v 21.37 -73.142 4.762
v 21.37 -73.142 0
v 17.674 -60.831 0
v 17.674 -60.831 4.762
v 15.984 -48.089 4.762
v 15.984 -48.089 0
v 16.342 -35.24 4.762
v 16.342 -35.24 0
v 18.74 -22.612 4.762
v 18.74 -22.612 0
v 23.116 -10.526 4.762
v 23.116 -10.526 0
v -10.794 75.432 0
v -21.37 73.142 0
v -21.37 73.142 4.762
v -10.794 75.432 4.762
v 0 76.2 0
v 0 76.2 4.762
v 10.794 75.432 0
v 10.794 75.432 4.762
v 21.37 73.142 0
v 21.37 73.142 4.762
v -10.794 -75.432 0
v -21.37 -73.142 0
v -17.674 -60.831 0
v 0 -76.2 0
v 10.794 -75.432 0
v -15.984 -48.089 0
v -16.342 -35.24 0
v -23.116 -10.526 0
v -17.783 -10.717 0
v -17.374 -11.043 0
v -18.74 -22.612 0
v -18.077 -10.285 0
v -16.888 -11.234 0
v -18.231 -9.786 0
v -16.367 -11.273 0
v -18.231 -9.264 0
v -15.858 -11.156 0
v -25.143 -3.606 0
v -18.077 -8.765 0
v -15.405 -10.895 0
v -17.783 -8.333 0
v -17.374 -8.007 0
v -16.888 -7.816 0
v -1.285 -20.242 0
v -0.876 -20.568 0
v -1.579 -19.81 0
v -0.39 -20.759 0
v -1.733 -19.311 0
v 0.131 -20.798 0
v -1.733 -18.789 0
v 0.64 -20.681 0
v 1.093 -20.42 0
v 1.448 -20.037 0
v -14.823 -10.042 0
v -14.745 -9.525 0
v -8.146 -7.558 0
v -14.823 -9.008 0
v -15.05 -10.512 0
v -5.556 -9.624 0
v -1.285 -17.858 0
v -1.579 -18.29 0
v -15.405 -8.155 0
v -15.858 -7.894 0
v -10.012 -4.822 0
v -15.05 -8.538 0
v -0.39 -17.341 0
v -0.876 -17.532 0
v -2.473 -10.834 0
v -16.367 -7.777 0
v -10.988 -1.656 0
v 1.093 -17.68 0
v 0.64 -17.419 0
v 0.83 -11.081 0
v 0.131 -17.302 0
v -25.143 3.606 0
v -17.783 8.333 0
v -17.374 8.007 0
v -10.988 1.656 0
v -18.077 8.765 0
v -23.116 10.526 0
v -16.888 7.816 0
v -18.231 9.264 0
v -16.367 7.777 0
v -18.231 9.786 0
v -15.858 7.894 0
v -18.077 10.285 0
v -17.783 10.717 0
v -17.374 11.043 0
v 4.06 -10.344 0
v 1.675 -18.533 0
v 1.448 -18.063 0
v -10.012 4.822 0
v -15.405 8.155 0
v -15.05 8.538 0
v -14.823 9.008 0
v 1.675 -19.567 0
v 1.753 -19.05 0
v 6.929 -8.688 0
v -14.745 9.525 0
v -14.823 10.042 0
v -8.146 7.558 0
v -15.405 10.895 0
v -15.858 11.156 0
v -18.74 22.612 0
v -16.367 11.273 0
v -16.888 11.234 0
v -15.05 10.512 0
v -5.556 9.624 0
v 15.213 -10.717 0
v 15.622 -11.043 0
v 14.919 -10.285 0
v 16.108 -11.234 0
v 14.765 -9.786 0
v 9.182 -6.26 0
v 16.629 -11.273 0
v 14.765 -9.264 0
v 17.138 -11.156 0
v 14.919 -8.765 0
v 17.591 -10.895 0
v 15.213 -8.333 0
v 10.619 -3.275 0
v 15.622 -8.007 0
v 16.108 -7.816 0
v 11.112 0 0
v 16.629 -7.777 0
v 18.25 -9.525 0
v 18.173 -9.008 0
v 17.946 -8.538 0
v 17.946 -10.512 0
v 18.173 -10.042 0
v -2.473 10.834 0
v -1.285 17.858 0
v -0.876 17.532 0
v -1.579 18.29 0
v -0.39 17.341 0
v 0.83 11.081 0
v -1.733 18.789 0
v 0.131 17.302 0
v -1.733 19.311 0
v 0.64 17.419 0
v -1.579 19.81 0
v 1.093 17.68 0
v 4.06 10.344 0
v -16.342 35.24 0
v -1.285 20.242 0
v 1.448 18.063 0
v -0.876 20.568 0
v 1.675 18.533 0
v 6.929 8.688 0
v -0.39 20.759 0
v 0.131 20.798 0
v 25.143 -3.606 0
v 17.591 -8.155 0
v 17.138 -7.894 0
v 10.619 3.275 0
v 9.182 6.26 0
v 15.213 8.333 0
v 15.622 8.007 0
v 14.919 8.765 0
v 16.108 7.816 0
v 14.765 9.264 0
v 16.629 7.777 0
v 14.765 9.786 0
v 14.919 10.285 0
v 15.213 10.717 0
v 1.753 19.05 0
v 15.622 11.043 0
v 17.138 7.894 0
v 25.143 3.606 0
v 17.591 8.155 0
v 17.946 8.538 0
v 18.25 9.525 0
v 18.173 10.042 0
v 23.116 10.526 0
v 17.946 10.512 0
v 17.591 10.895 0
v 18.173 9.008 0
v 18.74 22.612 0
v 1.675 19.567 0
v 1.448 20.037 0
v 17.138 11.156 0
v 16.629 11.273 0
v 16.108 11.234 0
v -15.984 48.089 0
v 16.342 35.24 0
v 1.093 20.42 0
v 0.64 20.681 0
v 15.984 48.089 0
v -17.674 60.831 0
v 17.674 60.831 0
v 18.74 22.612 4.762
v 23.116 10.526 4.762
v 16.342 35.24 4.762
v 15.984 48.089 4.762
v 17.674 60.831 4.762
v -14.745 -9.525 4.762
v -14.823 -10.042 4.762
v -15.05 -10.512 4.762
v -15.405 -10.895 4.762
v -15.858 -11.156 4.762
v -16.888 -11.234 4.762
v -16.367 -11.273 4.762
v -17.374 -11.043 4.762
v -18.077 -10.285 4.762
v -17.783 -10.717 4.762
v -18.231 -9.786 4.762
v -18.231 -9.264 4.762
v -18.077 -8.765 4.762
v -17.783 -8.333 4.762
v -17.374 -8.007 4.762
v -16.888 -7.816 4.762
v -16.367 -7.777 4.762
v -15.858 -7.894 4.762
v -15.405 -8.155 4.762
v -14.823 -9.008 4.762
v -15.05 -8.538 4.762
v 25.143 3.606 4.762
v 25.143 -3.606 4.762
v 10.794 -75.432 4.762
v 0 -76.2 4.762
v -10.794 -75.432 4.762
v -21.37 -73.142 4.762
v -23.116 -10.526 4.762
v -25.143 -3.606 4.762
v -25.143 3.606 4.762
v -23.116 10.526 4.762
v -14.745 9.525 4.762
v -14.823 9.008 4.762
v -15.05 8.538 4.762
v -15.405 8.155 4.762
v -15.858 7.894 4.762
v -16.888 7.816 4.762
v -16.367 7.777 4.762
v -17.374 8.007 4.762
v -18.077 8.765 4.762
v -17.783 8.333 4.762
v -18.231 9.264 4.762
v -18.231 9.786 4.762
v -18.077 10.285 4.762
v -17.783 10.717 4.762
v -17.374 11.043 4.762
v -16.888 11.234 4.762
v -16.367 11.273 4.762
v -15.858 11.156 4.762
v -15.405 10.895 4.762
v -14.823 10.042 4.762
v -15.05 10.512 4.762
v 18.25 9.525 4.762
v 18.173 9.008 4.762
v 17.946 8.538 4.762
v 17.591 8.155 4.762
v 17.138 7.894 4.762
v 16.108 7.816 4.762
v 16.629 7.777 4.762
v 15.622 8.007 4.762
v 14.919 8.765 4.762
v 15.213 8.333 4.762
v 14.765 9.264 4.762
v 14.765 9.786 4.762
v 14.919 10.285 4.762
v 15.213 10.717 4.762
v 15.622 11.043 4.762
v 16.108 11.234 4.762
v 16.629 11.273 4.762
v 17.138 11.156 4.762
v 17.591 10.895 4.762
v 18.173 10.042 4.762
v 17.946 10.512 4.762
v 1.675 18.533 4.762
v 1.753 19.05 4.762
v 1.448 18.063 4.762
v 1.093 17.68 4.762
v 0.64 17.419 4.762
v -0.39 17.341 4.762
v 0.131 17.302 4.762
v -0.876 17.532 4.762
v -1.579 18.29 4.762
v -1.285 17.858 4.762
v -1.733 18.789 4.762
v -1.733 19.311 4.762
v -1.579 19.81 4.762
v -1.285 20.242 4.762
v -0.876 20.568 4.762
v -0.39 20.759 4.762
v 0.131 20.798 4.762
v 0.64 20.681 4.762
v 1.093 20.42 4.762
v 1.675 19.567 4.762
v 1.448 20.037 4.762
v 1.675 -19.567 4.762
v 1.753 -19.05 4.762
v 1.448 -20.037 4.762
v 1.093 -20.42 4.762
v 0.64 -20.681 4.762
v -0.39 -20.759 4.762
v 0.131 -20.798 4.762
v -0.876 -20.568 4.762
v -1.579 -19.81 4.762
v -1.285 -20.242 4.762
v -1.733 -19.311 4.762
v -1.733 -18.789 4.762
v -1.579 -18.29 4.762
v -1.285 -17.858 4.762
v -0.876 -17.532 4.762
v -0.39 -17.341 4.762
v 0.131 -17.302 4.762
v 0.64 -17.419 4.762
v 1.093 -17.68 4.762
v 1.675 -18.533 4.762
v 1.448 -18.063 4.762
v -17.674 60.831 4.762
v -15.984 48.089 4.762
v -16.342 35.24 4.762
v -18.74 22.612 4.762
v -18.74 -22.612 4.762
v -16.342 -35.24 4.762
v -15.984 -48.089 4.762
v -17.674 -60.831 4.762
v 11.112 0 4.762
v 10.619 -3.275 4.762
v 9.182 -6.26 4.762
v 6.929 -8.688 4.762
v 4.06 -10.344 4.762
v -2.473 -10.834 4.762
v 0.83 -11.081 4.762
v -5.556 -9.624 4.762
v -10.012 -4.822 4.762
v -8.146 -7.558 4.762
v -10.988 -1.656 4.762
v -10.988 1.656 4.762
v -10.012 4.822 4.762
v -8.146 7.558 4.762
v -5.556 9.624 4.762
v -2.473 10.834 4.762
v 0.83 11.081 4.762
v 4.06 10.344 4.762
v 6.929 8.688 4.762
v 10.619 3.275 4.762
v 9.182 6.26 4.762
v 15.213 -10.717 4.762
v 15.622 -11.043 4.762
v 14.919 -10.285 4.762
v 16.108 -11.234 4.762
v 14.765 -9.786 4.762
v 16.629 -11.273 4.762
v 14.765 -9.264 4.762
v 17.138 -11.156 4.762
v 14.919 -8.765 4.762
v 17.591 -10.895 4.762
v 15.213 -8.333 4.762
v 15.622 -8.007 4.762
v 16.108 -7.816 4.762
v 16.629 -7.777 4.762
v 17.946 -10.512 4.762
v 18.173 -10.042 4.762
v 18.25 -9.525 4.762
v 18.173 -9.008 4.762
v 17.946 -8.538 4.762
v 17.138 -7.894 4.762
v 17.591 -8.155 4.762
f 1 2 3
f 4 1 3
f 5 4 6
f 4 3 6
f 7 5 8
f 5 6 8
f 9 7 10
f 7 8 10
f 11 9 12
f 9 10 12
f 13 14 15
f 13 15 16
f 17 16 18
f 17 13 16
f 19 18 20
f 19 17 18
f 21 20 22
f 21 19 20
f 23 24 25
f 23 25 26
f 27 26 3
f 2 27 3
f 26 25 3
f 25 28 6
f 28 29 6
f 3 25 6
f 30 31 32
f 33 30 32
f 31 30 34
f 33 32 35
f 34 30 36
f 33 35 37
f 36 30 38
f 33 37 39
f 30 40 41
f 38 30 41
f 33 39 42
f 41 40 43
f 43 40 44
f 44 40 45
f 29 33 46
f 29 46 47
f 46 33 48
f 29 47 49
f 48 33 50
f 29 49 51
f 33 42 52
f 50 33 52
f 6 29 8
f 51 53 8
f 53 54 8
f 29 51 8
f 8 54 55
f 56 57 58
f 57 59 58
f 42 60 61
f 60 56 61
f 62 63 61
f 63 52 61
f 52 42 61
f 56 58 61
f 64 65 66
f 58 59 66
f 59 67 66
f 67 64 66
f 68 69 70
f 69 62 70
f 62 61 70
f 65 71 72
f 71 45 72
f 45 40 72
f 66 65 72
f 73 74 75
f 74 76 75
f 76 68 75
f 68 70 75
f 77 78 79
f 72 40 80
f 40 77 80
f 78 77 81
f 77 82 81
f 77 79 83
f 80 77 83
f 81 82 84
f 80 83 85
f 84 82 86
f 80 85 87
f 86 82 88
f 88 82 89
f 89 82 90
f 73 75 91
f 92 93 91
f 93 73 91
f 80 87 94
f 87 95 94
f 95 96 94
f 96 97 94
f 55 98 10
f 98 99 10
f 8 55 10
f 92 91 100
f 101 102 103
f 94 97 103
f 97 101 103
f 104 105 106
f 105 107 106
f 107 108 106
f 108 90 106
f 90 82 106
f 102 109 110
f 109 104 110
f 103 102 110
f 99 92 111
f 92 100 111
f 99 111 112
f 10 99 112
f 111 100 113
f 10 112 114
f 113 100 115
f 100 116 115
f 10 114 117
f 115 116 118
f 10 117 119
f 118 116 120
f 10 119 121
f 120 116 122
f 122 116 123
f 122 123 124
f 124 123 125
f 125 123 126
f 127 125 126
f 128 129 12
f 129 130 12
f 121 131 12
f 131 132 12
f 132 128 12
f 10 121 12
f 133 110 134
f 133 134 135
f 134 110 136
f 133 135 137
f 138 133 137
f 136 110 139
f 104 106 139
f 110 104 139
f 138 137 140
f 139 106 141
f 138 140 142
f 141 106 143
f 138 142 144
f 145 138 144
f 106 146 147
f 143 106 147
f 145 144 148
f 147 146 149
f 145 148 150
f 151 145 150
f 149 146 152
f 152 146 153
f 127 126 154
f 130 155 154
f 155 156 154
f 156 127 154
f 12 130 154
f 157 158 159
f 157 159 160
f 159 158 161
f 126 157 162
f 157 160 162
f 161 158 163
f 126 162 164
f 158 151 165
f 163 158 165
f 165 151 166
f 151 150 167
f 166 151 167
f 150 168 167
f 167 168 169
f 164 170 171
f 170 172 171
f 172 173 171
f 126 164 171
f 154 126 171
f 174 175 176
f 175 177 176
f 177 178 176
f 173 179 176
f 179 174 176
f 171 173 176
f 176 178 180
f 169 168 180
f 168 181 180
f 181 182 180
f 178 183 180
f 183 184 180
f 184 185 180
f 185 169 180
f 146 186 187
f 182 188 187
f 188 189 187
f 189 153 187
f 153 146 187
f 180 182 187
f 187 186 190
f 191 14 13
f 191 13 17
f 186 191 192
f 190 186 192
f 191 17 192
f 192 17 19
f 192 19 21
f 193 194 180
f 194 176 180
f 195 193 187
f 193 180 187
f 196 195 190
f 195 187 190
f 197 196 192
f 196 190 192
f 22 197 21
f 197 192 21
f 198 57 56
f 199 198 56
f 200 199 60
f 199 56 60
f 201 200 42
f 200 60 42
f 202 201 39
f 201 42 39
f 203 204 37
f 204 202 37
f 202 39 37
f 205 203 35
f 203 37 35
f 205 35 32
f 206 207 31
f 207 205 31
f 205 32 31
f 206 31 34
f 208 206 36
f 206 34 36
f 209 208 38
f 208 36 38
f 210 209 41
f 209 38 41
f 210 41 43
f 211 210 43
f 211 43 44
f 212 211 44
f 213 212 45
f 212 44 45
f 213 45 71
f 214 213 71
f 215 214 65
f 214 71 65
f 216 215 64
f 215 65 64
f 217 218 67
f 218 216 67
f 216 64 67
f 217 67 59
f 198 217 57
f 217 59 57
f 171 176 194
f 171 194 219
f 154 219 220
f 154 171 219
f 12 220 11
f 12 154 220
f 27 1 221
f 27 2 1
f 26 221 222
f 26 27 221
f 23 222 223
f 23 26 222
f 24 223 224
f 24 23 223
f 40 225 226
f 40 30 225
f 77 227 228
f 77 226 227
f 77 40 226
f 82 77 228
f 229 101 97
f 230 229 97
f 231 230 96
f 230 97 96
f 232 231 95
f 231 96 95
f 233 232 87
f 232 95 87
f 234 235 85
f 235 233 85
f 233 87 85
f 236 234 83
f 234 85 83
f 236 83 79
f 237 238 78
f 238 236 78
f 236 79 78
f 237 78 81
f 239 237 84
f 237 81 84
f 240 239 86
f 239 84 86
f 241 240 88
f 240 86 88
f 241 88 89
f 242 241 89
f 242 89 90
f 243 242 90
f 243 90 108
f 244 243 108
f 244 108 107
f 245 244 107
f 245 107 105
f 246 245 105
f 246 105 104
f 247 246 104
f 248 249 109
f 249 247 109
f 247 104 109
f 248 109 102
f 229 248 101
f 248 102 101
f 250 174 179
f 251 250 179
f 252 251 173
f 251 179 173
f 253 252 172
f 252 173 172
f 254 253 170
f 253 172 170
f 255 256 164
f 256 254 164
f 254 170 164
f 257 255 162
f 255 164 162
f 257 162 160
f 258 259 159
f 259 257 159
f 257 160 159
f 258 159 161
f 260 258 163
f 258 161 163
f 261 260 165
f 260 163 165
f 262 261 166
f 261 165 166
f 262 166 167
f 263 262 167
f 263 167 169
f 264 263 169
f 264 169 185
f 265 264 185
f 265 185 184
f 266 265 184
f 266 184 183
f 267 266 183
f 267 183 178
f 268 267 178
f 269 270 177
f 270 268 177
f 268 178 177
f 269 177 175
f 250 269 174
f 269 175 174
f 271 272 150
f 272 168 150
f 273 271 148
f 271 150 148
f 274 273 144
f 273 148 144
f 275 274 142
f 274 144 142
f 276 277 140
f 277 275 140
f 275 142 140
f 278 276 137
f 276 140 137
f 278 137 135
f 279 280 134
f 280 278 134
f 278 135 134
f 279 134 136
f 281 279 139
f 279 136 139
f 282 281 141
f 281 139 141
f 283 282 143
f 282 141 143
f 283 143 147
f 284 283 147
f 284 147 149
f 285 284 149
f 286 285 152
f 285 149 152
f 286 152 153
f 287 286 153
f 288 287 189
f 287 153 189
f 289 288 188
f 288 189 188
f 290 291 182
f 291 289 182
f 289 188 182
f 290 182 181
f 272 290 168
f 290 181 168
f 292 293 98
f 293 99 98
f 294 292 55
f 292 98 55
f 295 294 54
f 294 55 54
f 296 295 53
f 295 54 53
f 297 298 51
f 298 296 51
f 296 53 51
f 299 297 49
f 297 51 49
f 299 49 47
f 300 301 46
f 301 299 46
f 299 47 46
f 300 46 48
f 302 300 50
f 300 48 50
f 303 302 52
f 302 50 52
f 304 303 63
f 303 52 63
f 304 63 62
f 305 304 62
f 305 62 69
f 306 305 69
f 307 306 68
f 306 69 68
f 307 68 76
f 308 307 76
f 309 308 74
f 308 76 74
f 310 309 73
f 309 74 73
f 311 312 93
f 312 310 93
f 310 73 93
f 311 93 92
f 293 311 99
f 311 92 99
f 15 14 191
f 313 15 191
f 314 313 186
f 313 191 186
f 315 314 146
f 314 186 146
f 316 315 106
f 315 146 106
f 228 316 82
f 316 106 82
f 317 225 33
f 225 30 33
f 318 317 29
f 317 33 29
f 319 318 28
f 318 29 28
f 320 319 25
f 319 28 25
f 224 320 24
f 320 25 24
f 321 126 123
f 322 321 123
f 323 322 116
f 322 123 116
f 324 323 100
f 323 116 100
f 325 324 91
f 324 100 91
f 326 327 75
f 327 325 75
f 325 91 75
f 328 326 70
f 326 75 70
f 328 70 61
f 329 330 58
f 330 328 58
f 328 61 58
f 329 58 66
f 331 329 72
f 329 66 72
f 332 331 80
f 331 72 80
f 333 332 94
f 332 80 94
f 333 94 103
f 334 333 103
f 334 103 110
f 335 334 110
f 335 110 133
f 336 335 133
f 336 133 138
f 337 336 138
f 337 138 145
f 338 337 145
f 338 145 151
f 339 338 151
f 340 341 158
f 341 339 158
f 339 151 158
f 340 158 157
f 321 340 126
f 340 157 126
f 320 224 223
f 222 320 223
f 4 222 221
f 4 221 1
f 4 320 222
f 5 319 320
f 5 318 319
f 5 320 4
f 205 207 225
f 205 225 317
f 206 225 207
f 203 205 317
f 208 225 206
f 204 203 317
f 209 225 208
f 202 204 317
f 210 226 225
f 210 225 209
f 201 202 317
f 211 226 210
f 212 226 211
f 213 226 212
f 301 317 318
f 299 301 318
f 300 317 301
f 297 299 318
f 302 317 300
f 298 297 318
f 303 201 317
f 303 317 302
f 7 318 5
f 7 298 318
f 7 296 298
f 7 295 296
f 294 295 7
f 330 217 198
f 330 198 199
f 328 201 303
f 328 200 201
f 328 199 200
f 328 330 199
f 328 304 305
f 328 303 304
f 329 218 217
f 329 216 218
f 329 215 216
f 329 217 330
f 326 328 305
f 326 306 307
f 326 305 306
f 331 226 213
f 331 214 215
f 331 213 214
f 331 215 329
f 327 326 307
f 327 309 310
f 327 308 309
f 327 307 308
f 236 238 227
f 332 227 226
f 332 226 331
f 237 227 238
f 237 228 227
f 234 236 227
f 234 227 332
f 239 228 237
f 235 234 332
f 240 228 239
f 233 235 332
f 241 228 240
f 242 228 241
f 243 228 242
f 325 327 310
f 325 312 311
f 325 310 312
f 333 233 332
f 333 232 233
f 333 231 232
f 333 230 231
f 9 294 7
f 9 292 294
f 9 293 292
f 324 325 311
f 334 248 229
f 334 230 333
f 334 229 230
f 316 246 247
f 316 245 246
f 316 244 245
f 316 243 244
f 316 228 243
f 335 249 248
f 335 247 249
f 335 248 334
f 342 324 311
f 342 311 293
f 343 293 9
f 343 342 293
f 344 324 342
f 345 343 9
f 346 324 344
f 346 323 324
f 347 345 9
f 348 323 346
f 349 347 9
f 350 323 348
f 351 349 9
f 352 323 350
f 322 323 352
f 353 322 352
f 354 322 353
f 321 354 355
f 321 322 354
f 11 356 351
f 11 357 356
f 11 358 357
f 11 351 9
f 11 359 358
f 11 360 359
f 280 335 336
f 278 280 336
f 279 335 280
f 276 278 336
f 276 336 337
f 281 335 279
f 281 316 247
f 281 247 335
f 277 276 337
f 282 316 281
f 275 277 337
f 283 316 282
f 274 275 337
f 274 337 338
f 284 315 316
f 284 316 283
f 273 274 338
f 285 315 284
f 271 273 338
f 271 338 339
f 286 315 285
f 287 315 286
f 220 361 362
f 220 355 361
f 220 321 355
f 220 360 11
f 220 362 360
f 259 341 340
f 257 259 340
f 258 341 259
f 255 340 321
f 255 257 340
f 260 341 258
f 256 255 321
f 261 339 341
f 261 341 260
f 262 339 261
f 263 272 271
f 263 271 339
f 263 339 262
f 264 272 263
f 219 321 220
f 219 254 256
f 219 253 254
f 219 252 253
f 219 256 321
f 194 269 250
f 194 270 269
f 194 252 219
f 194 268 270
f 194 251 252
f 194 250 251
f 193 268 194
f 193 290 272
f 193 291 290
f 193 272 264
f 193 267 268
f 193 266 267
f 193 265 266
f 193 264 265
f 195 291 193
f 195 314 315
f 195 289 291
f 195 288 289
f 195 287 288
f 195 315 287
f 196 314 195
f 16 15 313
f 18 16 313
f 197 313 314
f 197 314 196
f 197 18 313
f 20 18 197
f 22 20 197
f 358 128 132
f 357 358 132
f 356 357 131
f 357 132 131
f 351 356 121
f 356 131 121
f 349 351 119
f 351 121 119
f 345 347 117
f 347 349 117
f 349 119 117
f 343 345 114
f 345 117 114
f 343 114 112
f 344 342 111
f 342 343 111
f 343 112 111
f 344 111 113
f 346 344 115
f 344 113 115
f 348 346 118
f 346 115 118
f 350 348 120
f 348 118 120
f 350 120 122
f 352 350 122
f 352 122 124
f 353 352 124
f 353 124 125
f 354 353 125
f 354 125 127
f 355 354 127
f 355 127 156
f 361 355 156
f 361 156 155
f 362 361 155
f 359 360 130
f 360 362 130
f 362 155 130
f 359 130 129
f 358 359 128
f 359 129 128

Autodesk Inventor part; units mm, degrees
ref_plane "YZ Plane" through (0, 0, 0) normal (1, 0, 0) x (0, 1, 0)
ref_plane "XZ Plane" through (0, 0, 0) normal (0, 1, 0) x (-1, 0, 0)
ref_plane "XY Plane" through (0, 0, 0) normal (0, 0, 1) x (1, 0, 0)
sketch "Sketch1" plane through (0, 0, 0) normal (0, 0, 1) x (1, 0, 0)
  circle A0 centre (0, 0) radius 11.1125
  line L0 (0, 0) -> (0, 19.05) construction
  circle A1 centre (0, 19.05) radius 1.7526
  circle A2 centre (-16.4978, 9.525) radius 1.7526
  circle A3 centre (-16.4978, -9.525) radius 1.7526
  circle A4 centre (0, -19.05) radius 1.7526
  circle A5 centre (16.4978, -9.525) radius 1.7526
  circle A6 centre (16.4978, 9.525) radius 1.7526
  circle A7 centre (0, 0) radius 76.2 construction
  line L1 (-15.875, -74.528) -> (15.875, -74.528) construction
  line L2 (15.875, -74.528) -> (15.875, 74.528) construction
  line L3 (15.875, 74.528) -> (-15.875, 74.528) construction
  line L4 (-15.875, 74.528) -> (-15.875, -74.528) construction
  line L5 (-15.875, -74.528) -> (15.875, 74.528) construction
  line L6 (15.875, -74.528) -> (-15.875, 74.528) construction
  line L7 (0, 76.2) -> (0, -76.2) construction
  line L8 (0, 0) -> (21.3699, 73.1421) construction
  circle A8 centre (0, 0) radius 66.675 construction
  circle A9 centre (0, 0) radius 25.4
  line L9 (21.3699, 73.1421) -> (17.8969, 64.2282) construction
  arc A10 (21.3699, 73.1421) -> (-21.3699, 73.1421) centre (0, 0) ccw
  line L10 (-15.875, 0) -> (15.875, 0) construction
  arc A11 (-21.3699, -73.1421) -> (21.3699, -73.1421) centre (0, 0) ccw
  arc A12 (21.3699, 73.1421) -> (23.1163, 10.5259) centre (96.4161, 43.9028) ccw
  arc A13 (-23.1163, 10.5259) -> (-21.3699, 73.1421) centre (-96.4161, 43.9028) ccw
  arc A14 (23.1163, -10.5259) -> (21.3699, -73.1421) centre (96.4161, -43.9028) ccw
  arc A15 (-21.3699, -73.1421) -> (-23.1163, -10.5259) centre (-96.4161, -43.9028) ccw
  point P0 (0, 74.528)
  point P1 (0, -66.675)
  point P2 (23.1163, -10.5259)
  point P3 (-23.1163, -10.5259)
  point P4 (-23.1163, 10.5259)
  dimension "d10" = 50.8
  dimension "d0" = 22.225
  dimension "d1" = 19.05
  dimension "d2" = 3.5052
  dimension "d5" = 360
  dimension "d7" = 152.4
  dimension "d8" = 31.75
  dimension "d9" = 9.525
  dimension "d11" = 5
extrude "Extrusion1" add sketch "Sketch1" along normal blind 4.7625
sketch "Sketch3" plane through (0, 0, 0) normal (0, 0, -1) x (-1, 0, 0)
  circle A0 centre (0, 0) radius 76.2 construction
  point P0 (21.3699, 73.1421)
  dimension "d25" = 152.4
properties part number "Blade (Bar)" material "Stainless Steel"
